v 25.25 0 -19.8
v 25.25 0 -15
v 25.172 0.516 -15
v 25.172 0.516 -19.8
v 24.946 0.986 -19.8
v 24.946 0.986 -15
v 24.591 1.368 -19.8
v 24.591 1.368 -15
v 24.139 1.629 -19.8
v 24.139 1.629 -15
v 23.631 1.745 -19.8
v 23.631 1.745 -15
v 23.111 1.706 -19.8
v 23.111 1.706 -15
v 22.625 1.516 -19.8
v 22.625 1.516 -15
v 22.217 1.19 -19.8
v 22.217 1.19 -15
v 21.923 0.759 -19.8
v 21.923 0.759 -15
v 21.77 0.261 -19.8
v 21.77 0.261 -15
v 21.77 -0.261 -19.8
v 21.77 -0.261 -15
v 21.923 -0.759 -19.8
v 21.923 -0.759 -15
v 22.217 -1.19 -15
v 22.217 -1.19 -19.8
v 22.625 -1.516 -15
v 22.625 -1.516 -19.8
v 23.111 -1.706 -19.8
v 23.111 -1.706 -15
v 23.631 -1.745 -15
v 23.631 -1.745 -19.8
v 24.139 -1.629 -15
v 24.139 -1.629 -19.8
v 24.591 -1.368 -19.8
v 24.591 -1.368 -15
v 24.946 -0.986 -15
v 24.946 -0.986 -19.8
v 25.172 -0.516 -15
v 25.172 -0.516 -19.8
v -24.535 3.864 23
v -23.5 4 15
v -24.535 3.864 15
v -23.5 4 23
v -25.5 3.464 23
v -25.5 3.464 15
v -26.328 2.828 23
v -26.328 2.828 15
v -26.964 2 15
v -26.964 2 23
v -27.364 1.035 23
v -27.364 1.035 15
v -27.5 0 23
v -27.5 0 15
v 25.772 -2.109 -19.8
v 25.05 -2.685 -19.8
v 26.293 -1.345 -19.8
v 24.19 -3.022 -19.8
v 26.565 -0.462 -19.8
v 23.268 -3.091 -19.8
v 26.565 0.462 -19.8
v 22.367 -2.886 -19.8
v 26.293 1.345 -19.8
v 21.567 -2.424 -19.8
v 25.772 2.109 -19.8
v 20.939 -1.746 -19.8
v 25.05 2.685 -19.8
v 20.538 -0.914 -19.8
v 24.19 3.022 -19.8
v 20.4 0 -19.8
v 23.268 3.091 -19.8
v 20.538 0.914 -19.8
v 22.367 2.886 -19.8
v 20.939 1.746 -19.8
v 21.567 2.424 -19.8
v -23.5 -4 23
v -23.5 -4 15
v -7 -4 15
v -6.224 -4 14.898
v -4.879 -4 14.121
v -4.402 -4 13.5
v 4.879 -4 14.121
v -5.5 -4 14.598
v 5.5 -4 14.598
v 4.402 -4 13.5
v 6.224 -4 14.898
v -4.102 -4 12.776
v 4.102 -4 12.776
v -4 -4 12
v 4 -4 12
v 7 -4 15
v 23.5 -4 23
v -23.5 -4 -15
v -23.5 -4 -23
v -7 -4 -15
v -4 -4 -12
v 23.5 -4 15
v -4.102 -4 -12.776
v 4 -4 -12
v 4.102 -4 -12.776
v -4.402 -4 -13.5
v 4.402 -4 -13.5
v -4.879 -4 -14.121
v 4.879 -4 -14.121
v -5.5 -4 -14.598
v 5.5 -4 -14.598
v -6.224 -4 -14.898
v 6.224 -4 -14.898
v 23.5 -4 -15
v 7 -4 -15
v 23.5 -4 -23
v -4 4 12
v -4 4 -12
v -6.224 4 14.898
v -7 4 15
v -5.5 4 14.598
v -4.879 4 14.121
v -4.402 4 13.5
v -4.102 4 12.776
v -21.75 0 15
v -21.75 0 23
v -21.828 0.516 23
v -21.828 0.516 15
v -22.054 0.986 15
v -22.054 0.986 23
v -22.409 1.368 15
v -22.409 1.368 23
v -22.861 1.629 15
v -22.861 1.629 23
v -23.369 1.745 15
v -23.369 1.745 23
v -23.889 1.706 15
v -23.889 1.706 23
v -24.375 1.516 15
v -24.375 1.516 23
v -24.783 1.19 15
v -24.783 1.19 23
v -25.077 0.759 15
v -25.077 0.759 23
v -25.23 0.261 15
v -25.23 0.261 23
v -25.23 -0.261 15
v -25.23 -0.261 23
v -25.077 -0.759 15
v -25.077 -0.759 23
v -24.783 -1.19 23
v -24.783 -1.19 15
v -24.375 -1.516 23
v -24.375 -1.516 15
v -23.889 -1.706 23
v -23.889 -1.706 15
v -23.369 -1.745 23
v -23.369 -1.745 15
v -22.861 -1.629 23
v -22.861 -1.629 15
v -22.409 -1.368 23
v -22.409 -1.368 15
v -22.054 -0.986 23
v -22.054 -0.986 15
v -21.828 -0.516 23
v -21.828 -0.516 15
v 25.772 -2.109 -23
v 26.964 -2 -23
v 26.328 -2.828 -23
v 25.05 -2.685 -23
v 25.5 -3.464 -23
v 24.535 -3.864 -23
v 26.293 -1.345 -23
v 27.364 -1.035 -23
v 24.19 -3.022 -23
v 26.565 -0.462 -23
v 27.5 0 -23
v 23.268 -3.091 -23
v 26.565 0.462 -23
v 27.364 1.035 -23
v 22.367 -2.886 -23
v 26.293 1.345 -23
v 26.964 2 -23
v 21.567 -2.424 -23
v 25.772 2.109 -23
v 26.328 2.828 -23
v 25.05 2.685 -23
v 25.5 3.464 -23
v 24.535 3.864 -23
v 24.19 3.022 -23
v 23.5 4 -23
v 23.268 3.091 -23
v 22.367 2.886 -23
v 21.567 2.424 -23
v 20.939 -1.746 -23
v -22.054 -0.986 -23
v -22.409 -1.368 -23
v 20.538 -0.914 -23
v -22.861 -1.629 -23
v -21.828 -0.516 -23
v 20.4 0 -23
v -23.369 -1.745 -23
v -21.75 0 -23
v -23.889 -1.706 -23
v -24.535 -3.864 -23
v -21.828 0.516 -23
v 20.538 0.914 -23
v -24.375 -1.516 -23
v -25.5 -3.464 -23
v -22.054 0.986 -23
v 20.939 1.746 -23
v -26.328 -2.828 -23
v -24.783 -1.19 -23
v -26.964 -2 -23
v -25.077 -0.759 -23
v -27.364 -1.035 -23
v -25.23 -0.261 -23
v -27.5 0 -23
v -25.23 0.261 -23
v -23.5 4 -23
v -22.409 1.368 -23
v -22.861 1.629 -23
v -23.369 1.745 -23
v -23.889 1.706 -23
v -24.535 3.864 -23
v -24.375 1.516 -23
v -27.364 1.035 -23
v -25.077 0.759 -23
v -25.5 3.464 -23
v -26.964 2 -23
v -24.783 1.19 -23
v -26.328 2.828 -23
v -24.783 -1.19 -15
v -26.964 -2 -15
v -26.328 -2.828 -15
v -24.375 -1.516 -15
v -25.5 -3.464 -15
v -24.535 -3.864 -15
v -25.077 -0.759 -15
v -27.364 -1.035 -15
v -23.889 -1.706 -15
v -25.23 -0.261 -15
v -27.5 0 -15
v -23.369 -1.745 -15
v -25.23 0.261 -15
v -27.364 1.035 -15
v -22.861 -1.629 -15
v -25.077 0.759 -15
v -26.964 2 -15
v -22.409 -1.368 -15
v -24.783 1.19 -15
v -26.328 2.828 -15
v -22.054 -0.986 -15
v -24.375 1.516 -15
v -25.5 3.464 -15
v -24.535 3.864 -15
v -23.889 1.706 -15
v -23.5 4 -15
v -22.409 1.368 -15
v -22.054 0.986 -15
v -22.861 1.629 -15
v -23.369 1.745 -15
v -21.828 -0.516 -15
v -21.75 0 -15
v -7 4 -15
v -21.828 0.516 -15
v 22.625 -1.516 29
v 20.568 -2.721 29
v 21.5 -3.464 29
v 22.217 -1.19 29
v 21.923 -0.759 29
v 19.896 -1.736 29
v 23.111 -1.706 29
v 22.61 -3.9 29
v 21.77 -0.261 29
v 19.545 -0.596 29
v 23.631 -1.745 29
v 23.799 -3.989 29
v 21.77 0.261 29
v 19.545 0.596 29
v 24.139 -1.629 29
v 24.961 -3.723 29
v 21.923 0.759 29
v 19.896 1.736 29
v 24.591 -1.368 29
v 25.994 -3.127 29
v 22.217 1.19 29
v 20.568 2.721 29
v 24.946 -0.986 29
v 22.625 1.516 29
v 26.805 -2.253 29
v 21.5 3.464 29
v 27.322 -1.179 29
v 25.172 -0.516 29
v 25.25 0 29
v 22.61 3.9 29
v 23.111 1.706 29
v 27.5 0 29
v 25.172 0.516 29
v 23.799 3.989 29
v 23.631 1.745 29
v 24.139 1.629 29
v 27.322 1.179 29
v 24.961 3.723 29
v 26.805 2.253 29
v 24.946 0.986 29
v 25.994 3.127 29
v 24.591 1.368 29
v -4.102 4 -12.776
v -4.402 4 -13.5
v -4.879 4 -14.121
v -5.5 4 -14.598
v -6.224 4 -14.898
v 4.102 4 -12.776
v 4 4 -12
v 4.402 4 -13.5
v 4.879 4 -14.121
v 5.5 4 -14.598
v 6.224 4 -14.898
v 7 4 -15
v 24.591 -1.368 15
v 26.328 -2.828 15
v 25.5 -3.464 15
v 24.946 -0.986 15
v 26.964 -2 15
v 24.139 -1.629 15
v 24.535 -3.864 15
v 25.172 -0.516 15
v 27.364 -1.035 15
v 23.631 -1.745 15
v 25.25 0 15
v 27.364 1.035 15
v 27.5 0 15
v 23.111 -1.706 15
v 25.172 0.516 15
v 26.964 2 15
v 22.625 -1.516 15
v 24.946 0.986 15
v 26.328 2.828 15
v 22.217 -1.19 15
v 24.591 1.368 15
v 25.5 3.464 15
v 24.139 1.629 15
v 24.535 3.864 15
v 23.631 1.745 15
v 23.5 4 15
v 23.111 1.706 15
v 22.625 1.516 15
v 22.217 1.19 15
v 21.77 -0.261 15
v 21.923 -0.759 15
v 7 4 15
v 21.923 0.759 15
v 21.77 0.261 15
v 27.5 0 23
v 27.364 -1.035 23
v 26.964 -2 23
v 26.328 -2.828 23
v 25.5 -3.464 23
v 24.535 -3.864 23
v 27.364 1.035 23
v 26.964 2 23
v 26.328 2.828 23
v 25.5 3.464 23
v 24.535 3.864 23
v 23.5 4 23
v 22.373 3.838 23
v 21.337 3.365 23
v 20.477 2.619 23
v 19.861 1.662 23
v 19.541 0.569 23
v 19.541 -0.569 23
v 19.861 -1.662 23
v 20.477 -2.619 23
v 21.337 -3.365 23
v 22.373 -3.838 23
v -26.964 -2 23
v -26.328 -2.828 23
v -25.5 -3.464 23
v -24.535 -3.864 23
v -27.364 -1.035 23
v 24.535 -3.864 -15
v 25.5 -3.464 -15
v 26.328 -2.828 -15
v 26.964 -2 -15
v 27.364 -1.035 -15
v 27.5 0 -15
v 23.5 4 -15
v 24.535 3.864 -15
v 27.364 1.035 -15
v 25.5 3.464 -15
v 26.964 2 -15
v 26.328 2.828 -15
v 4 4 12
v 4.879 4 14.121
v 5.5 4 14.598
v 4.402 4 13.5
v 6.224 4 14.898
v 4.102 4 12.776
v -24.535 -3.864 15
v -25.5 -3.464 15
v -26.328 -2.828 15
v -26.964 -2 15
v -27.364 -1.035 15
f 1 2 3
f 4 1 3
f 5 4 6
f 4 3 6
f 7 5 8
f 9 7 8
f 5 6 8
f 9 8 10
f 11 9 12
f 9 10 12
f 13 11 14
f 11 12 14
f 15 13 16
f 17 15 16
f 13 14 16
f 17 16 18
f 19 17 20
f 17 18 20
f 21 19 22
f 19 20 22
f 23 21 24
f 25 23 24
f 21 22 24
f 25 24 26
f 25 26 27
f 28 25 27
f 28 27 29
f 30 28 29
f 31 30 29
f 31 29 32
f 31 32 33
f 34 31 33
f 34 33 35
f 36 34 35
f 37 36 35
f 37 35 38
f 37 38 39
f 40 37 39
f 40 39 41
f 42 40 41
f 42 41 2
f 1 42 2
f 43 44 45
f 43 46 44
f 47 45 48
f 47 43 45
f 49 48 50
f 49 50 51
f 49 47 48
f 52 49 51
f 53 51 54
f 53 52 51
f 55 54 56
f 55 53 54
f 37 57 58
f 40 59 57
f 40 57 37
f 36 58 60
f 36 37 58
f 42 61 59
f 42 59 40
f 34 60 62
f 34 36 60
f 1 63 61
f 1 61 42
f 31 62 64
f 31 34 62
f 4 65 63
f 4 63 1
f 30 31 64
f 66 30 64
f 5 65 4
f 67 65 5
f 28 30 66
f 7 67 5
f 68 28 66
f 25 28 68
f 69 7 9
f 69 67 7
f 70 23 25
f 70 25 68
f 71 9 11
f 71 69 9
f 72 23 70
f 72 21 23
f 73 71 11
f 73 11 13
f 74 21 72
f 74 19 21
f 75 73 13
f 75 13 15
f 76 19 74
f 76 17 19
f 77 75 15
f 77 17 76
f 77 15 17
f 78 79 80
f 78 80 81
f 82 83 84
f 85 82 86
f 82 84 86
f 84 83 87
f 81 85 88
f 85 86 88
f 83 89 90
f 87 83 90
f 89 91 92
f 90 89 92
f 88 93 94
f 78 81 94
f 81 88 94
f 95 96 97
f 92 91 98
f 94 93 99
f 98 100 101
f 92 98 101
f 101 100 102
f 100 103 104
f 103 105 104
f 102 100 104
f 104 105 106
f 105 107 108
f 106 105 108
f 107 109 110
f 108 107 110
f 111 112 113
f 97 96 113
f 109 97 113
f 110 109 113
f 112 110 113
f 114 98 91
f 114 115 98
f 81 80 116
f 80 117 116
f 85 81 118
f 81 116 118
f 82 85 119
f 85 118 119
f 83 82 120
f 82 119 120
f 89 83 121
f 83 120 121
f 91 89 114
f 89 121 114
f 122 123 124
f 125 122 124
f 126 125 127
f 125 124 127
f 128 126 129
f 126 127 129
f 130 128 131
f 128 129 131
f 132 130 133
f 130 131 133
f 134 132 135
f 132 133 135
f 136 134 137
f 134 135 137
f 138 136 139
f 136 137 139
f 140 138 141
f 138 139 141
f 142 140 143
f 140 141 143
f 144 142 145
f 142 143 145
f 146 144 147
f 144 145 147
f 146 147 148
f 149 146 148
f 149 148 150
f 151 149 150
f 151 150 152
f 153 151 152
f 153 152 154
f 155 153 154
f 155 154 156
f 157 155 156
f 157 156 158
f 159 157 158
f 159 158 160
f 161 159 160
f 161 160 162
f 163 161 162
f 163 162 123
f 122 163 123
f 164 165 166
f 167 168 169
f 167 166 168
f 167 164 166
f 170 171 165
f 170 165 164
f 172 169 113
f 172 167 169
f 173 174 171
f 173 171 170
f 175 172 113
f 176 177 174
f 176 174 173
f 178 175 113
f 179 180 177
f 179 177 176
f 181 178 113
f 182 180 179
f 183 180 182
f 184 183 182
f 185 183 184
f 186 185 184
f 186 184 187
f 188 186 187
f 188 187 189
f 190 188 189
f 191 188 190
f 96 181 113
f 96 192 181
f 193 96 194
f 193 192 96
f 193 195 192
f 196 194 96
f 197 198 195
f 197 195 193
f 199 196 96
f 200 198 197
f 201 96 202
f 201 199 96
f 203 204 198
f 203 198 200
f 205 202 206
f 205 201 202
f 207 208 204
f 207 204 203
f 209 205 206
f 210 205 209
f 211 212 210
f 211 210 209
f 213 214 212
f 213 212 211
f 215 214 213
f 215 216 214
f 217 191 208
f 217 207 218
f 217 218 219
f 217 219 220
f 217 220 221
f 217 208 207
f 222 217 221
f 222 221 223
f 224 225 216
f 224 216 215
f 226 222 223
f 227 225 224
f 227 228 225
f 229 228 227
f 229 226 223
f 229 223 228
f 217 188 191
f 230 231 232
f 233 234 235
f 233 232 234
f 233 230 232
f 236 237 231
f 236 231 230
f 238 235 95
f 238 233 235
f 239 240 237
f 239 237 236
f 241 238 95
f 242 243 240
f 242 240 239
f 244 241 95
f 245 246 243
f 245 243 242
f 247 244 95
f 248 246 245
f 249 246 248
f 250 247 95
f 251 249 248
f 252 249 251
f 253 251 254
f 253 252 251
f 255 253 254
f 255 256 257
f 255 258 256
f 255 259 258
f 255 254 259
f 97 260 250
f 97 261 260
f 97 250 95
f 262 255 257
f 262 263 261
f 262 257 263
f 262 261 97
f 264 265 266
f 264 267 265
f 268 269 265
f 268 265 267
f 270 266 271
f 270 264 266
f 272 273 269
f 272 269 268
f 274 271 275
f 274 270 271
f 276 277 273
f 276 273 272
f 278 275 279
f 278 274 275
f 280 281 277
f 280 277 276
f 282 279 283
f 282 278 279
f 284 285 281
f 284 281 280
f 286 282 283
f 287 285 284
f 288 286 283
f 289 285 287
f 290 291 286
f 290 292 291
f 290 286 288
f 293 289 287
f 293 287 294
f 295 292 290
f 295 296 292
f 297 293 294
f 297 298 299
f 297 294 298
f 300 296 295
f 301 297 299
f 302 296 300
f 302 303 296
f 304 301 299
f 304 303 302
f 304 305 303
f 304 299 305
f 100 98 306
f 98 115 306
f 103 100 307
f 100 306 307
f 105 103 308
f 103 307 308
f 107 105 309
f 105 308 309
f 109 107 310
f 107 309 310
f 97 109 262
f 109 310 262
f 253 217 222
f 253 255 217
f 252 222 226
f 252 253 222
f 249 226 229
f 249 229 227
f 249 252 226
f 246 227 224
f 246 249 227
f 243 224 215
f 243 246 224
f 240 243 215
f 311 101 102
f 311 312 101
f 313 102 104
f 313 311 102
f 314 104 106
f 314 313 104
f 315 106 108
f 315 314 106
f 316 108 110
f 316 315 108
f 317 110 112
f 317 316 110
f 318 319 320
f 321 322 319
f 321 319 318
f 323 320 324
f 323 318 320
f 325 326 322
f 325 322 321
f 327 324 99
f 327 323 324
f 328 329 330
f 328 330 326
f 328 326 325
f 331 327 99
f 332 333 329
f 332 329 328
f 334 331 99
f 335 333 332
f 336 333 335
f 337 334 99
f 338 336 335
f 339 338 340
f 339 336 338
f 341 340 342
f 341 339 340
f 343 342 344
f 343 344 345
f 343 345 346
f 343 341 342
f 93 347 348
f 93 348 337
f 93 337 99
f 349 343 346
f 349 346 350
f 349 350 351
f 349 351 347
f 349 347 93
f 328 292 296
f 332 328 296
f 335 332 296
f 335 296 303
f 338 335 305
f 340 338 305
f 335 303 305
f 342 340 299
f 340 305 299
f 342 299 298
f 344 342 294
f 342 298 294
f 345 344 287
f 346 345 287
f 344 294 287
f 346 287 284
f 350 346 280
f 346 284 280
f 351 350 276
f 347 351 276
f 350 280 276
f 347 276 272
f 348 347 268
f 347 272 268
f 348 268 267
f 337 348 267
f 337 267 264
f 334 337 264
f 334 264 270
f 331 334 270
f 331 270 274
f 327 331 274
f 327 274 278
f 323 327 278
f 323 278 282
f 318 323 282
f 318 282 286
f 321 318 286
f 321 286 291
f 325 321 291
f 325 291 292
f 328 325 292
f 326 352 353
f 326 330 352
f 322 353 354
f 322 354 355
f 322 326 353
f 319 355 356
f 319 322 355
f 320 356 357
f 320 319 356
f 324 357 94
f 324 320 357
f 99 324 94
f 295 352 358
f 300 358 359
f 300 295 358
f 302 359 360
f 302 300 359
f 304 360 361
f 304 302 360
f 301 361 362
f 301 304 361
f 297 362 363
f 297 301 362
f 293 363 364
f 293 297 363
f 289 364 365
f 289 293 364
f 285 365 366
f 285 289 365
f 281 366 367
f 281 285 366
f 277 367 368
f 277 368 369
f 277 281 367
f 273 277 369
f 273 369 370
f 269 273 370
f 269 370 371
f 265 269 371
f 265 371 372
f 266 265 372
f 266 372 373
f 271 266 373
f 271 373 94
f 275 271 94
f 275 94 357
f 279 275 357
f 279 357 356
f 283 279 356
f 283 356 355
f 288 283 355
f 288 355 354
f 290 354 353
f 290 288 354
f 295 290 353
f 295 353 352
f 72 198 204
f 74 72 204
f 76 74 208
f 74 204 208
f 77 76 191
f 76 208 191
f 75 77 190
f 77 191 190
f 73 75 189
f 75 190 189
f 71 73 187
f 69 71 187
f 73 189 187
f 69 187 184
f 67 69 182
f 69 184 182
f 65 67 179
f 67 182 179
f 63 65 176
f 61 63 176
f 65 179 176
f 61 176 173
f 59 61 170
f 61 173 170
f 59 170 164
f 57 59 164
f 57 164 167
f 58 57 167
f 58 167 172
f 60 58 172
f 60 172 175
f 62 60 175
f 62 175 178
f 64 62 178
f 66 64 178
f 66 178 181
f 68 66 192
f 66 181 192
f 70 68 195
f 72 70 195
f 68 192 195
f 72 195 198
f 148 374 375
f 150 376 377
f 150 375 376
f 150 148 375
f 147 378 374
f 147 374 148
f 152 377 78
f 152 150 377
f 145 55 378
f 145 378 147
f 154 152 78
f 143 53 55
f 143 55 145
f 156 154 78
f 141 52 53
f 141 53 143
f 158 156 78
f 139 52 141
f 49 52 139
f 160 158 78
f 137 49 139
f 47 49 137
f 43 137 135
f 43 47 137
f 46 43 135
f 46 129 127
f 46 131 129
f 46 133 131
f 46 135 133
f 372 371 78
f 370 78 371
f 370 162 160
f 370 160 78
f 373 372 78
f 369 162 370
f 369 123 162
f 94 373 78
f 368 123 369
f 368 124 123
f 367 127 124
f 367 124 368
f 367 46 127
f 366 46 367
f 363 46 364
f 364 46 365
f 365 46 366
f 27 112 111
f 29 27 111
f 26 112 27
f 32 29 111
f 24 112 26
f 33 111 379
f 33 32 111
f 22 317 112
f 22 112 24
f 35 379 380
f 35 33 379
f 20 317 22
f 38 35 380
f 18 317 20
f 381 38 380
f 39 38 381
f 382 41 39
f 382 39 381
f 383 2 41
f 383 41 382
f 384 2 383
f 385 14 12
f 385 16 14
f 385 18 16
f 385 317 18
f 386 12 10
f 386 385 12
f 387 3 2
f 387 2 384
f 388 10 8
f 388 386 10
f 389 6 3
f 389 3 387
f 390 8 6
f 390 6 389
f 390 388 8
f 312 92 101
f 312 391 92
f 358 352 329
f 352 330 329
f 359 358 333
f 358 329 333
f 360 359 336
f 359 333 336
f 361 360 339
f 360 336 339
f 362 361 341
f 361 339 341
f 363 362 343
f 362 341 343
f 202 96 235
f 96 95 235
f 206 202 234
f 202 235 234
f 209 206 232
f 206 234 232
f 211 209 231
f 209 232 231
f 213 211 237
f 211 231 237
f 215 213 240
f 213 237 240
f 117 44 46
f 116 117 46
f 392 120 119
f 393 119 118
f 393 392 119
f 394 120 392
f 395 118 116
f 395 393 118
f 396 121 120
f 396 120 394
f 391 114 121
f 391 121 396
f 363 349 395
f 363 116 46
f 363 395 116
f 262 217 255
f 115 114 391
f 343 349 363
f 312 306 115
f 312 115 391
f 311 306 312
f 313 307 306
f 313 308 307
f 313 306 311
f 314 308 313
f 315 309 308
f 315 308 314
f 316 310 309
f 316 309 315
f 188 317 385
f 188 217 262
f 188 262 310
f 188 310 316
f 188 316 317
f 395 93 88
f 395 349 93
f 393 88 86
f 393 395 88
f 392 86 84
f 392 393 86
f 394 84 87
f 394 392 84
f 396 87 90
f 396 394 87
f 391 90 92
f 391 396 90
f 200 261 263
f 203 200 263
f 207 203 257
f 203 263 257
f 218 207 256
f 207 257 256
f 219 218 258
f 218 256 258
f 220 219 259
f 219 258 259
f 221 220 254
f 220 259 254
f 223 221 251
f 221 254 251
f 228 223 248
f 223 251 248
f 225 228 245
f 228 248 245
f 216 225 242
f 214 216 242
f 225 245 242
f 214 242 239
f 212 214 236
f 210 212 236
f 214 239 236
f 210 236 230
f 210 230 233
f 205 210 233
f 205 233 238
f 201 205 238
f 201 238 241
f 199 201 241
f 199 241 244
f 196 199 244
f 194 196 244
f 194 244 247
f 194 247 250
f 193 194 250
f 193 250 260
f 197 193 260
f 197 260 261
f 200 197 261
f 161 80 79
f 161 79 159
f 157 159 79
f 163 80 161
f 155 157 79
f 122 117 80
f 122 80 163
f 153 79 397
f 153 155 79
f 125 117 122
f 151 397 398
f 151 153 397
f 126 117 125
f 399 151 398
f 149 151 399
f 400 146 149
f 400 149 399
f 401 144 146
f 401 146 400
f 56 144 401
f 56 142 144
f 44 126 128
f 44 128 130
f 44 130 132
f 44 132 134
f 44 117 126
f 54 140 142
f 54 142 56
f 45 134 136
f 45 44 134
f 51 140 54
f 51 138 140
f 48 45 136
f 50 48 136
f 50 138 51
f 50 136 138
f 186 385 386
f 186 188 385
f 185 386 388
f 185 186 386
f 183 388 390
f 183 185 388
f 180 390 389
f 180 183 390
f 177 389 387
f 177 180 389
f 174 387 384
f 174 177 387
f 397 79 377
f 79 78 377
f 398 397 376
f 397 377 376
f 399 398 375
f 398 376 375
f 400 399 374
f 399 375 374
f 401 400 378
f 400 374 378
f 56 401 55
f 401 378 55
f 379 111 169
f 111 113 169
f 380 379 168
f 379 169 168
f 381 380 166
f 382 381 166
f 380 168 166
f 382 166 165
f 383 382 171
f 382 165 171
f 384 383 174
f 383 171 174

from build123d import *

# Parameters (mm, degrees)
SALIENTE_EXTRUIR1_DEPTH = 4
CROQUIS3_R              = 1.75
CORTAR_EXTRUIR1_DEPTH   = 54.742441329
REDONDEO8_R             = 4
REDONDEO9_R             = 3
SALIENTE_EXTRUIR2_START = 6
CROQUIS4_R              = 4
CROQUIS4_R_2            = 1.75
SALIENTE_EXTRUIR2_DEPTH = 6
CROQUIS5_R              = 3.1
CORTAR_EXTRUIR2_DEPTH   = 3.2


with BuildPart() as part:
    # Croquis2 → Saliente-Extruir1 (new, symmetric)
    with BuildSketch(Plane(origin=(0, 0, 0), x_dir=(1, 0, 0), z_dir=(0, 1, 0))):
        Polygon((27.5, -23), (27.5, -15), (4, -15), (4, 15), (27.5, 15), (27.5, 23), (-27.5, 23), (-27.5, 15), (-4, 15), (-4, -15), (-27.5, -15), (-27.5, -23), align=None)
    extrude(amount=SALIENTE_EXTRUIR1_DEPTH, both=True)

    # Croquis3 → Cortar-Extruir1 (cut, through all)
    with BuildSketch(Plane.XY.offset(23)):
        with Locations((23.5, 0)):
            Circle(CROQUIS3_R)
        with Locations((-23.5, 0)):
            Circle(CROQUIS3_R)
    extrude(amount=-CORTAR_EXTRUIR1_DEPTH, mode=Mode.SUBTRACT)

    # Redondeo8
    redondeo8_edges = [part.edges().sort_by_distance(p)[0] for p in [
        (27.5, -4, -19),
        (27.5, 4, -19),
        (27.5, -4, 19),
        (27.5, 4, 19),
        (-27.5, -4, -19),
        (-27.5, 4, -19),
        (-27.5, -4, 19),
        (-27.5, 4, 19),
    ]]
    fillet(redondeo8_edges, radius=REDONDEO8_R - 0.0001)  # a hair under: the kernel refuses the full size

    # Redondeo9
    redondeo9_edges = [part.edges().sort_by_distance(p)[0] for p in [
        (4, 0, -15),
        (4, 0, 15),
        (-4, 0, 15),
        (-4, 0, -15),
    ]]
    fillet(redondeo9_edges, radius=REDONDEO9_R)

    # Croquis4 → Saliente-Extruir2 (add)
    with BuildSketch(Plane.XY.offset(23).offset(SALIENTE_EXTRUIR2_START)):
        with Locations((23.5, 0)):
            Circle(CROQUIS4_R)
        with Locations((23.5, 0)):
            Circle(CROQUIS4_R_2, mode=Mode.SUBTRACT)
    extrude(amount=-SALIENTE_EXTRUIR2_DEPTH)

    # Croquis5 → Cortar-Extruir2 (cut)
    with BuildSketch(Plane(origin=(0, 0, -23), x_dir=(-1, 0, 0), z_dir=(0, 0, -1))):
        with Locations((-23.5, 0)):
            Circle(CROQUIS5_R)
    extrude(amount=-CORTAR_EXTRUIR2_DEPTH, mode=Mode.SUBTRACT)


solid = part.part
